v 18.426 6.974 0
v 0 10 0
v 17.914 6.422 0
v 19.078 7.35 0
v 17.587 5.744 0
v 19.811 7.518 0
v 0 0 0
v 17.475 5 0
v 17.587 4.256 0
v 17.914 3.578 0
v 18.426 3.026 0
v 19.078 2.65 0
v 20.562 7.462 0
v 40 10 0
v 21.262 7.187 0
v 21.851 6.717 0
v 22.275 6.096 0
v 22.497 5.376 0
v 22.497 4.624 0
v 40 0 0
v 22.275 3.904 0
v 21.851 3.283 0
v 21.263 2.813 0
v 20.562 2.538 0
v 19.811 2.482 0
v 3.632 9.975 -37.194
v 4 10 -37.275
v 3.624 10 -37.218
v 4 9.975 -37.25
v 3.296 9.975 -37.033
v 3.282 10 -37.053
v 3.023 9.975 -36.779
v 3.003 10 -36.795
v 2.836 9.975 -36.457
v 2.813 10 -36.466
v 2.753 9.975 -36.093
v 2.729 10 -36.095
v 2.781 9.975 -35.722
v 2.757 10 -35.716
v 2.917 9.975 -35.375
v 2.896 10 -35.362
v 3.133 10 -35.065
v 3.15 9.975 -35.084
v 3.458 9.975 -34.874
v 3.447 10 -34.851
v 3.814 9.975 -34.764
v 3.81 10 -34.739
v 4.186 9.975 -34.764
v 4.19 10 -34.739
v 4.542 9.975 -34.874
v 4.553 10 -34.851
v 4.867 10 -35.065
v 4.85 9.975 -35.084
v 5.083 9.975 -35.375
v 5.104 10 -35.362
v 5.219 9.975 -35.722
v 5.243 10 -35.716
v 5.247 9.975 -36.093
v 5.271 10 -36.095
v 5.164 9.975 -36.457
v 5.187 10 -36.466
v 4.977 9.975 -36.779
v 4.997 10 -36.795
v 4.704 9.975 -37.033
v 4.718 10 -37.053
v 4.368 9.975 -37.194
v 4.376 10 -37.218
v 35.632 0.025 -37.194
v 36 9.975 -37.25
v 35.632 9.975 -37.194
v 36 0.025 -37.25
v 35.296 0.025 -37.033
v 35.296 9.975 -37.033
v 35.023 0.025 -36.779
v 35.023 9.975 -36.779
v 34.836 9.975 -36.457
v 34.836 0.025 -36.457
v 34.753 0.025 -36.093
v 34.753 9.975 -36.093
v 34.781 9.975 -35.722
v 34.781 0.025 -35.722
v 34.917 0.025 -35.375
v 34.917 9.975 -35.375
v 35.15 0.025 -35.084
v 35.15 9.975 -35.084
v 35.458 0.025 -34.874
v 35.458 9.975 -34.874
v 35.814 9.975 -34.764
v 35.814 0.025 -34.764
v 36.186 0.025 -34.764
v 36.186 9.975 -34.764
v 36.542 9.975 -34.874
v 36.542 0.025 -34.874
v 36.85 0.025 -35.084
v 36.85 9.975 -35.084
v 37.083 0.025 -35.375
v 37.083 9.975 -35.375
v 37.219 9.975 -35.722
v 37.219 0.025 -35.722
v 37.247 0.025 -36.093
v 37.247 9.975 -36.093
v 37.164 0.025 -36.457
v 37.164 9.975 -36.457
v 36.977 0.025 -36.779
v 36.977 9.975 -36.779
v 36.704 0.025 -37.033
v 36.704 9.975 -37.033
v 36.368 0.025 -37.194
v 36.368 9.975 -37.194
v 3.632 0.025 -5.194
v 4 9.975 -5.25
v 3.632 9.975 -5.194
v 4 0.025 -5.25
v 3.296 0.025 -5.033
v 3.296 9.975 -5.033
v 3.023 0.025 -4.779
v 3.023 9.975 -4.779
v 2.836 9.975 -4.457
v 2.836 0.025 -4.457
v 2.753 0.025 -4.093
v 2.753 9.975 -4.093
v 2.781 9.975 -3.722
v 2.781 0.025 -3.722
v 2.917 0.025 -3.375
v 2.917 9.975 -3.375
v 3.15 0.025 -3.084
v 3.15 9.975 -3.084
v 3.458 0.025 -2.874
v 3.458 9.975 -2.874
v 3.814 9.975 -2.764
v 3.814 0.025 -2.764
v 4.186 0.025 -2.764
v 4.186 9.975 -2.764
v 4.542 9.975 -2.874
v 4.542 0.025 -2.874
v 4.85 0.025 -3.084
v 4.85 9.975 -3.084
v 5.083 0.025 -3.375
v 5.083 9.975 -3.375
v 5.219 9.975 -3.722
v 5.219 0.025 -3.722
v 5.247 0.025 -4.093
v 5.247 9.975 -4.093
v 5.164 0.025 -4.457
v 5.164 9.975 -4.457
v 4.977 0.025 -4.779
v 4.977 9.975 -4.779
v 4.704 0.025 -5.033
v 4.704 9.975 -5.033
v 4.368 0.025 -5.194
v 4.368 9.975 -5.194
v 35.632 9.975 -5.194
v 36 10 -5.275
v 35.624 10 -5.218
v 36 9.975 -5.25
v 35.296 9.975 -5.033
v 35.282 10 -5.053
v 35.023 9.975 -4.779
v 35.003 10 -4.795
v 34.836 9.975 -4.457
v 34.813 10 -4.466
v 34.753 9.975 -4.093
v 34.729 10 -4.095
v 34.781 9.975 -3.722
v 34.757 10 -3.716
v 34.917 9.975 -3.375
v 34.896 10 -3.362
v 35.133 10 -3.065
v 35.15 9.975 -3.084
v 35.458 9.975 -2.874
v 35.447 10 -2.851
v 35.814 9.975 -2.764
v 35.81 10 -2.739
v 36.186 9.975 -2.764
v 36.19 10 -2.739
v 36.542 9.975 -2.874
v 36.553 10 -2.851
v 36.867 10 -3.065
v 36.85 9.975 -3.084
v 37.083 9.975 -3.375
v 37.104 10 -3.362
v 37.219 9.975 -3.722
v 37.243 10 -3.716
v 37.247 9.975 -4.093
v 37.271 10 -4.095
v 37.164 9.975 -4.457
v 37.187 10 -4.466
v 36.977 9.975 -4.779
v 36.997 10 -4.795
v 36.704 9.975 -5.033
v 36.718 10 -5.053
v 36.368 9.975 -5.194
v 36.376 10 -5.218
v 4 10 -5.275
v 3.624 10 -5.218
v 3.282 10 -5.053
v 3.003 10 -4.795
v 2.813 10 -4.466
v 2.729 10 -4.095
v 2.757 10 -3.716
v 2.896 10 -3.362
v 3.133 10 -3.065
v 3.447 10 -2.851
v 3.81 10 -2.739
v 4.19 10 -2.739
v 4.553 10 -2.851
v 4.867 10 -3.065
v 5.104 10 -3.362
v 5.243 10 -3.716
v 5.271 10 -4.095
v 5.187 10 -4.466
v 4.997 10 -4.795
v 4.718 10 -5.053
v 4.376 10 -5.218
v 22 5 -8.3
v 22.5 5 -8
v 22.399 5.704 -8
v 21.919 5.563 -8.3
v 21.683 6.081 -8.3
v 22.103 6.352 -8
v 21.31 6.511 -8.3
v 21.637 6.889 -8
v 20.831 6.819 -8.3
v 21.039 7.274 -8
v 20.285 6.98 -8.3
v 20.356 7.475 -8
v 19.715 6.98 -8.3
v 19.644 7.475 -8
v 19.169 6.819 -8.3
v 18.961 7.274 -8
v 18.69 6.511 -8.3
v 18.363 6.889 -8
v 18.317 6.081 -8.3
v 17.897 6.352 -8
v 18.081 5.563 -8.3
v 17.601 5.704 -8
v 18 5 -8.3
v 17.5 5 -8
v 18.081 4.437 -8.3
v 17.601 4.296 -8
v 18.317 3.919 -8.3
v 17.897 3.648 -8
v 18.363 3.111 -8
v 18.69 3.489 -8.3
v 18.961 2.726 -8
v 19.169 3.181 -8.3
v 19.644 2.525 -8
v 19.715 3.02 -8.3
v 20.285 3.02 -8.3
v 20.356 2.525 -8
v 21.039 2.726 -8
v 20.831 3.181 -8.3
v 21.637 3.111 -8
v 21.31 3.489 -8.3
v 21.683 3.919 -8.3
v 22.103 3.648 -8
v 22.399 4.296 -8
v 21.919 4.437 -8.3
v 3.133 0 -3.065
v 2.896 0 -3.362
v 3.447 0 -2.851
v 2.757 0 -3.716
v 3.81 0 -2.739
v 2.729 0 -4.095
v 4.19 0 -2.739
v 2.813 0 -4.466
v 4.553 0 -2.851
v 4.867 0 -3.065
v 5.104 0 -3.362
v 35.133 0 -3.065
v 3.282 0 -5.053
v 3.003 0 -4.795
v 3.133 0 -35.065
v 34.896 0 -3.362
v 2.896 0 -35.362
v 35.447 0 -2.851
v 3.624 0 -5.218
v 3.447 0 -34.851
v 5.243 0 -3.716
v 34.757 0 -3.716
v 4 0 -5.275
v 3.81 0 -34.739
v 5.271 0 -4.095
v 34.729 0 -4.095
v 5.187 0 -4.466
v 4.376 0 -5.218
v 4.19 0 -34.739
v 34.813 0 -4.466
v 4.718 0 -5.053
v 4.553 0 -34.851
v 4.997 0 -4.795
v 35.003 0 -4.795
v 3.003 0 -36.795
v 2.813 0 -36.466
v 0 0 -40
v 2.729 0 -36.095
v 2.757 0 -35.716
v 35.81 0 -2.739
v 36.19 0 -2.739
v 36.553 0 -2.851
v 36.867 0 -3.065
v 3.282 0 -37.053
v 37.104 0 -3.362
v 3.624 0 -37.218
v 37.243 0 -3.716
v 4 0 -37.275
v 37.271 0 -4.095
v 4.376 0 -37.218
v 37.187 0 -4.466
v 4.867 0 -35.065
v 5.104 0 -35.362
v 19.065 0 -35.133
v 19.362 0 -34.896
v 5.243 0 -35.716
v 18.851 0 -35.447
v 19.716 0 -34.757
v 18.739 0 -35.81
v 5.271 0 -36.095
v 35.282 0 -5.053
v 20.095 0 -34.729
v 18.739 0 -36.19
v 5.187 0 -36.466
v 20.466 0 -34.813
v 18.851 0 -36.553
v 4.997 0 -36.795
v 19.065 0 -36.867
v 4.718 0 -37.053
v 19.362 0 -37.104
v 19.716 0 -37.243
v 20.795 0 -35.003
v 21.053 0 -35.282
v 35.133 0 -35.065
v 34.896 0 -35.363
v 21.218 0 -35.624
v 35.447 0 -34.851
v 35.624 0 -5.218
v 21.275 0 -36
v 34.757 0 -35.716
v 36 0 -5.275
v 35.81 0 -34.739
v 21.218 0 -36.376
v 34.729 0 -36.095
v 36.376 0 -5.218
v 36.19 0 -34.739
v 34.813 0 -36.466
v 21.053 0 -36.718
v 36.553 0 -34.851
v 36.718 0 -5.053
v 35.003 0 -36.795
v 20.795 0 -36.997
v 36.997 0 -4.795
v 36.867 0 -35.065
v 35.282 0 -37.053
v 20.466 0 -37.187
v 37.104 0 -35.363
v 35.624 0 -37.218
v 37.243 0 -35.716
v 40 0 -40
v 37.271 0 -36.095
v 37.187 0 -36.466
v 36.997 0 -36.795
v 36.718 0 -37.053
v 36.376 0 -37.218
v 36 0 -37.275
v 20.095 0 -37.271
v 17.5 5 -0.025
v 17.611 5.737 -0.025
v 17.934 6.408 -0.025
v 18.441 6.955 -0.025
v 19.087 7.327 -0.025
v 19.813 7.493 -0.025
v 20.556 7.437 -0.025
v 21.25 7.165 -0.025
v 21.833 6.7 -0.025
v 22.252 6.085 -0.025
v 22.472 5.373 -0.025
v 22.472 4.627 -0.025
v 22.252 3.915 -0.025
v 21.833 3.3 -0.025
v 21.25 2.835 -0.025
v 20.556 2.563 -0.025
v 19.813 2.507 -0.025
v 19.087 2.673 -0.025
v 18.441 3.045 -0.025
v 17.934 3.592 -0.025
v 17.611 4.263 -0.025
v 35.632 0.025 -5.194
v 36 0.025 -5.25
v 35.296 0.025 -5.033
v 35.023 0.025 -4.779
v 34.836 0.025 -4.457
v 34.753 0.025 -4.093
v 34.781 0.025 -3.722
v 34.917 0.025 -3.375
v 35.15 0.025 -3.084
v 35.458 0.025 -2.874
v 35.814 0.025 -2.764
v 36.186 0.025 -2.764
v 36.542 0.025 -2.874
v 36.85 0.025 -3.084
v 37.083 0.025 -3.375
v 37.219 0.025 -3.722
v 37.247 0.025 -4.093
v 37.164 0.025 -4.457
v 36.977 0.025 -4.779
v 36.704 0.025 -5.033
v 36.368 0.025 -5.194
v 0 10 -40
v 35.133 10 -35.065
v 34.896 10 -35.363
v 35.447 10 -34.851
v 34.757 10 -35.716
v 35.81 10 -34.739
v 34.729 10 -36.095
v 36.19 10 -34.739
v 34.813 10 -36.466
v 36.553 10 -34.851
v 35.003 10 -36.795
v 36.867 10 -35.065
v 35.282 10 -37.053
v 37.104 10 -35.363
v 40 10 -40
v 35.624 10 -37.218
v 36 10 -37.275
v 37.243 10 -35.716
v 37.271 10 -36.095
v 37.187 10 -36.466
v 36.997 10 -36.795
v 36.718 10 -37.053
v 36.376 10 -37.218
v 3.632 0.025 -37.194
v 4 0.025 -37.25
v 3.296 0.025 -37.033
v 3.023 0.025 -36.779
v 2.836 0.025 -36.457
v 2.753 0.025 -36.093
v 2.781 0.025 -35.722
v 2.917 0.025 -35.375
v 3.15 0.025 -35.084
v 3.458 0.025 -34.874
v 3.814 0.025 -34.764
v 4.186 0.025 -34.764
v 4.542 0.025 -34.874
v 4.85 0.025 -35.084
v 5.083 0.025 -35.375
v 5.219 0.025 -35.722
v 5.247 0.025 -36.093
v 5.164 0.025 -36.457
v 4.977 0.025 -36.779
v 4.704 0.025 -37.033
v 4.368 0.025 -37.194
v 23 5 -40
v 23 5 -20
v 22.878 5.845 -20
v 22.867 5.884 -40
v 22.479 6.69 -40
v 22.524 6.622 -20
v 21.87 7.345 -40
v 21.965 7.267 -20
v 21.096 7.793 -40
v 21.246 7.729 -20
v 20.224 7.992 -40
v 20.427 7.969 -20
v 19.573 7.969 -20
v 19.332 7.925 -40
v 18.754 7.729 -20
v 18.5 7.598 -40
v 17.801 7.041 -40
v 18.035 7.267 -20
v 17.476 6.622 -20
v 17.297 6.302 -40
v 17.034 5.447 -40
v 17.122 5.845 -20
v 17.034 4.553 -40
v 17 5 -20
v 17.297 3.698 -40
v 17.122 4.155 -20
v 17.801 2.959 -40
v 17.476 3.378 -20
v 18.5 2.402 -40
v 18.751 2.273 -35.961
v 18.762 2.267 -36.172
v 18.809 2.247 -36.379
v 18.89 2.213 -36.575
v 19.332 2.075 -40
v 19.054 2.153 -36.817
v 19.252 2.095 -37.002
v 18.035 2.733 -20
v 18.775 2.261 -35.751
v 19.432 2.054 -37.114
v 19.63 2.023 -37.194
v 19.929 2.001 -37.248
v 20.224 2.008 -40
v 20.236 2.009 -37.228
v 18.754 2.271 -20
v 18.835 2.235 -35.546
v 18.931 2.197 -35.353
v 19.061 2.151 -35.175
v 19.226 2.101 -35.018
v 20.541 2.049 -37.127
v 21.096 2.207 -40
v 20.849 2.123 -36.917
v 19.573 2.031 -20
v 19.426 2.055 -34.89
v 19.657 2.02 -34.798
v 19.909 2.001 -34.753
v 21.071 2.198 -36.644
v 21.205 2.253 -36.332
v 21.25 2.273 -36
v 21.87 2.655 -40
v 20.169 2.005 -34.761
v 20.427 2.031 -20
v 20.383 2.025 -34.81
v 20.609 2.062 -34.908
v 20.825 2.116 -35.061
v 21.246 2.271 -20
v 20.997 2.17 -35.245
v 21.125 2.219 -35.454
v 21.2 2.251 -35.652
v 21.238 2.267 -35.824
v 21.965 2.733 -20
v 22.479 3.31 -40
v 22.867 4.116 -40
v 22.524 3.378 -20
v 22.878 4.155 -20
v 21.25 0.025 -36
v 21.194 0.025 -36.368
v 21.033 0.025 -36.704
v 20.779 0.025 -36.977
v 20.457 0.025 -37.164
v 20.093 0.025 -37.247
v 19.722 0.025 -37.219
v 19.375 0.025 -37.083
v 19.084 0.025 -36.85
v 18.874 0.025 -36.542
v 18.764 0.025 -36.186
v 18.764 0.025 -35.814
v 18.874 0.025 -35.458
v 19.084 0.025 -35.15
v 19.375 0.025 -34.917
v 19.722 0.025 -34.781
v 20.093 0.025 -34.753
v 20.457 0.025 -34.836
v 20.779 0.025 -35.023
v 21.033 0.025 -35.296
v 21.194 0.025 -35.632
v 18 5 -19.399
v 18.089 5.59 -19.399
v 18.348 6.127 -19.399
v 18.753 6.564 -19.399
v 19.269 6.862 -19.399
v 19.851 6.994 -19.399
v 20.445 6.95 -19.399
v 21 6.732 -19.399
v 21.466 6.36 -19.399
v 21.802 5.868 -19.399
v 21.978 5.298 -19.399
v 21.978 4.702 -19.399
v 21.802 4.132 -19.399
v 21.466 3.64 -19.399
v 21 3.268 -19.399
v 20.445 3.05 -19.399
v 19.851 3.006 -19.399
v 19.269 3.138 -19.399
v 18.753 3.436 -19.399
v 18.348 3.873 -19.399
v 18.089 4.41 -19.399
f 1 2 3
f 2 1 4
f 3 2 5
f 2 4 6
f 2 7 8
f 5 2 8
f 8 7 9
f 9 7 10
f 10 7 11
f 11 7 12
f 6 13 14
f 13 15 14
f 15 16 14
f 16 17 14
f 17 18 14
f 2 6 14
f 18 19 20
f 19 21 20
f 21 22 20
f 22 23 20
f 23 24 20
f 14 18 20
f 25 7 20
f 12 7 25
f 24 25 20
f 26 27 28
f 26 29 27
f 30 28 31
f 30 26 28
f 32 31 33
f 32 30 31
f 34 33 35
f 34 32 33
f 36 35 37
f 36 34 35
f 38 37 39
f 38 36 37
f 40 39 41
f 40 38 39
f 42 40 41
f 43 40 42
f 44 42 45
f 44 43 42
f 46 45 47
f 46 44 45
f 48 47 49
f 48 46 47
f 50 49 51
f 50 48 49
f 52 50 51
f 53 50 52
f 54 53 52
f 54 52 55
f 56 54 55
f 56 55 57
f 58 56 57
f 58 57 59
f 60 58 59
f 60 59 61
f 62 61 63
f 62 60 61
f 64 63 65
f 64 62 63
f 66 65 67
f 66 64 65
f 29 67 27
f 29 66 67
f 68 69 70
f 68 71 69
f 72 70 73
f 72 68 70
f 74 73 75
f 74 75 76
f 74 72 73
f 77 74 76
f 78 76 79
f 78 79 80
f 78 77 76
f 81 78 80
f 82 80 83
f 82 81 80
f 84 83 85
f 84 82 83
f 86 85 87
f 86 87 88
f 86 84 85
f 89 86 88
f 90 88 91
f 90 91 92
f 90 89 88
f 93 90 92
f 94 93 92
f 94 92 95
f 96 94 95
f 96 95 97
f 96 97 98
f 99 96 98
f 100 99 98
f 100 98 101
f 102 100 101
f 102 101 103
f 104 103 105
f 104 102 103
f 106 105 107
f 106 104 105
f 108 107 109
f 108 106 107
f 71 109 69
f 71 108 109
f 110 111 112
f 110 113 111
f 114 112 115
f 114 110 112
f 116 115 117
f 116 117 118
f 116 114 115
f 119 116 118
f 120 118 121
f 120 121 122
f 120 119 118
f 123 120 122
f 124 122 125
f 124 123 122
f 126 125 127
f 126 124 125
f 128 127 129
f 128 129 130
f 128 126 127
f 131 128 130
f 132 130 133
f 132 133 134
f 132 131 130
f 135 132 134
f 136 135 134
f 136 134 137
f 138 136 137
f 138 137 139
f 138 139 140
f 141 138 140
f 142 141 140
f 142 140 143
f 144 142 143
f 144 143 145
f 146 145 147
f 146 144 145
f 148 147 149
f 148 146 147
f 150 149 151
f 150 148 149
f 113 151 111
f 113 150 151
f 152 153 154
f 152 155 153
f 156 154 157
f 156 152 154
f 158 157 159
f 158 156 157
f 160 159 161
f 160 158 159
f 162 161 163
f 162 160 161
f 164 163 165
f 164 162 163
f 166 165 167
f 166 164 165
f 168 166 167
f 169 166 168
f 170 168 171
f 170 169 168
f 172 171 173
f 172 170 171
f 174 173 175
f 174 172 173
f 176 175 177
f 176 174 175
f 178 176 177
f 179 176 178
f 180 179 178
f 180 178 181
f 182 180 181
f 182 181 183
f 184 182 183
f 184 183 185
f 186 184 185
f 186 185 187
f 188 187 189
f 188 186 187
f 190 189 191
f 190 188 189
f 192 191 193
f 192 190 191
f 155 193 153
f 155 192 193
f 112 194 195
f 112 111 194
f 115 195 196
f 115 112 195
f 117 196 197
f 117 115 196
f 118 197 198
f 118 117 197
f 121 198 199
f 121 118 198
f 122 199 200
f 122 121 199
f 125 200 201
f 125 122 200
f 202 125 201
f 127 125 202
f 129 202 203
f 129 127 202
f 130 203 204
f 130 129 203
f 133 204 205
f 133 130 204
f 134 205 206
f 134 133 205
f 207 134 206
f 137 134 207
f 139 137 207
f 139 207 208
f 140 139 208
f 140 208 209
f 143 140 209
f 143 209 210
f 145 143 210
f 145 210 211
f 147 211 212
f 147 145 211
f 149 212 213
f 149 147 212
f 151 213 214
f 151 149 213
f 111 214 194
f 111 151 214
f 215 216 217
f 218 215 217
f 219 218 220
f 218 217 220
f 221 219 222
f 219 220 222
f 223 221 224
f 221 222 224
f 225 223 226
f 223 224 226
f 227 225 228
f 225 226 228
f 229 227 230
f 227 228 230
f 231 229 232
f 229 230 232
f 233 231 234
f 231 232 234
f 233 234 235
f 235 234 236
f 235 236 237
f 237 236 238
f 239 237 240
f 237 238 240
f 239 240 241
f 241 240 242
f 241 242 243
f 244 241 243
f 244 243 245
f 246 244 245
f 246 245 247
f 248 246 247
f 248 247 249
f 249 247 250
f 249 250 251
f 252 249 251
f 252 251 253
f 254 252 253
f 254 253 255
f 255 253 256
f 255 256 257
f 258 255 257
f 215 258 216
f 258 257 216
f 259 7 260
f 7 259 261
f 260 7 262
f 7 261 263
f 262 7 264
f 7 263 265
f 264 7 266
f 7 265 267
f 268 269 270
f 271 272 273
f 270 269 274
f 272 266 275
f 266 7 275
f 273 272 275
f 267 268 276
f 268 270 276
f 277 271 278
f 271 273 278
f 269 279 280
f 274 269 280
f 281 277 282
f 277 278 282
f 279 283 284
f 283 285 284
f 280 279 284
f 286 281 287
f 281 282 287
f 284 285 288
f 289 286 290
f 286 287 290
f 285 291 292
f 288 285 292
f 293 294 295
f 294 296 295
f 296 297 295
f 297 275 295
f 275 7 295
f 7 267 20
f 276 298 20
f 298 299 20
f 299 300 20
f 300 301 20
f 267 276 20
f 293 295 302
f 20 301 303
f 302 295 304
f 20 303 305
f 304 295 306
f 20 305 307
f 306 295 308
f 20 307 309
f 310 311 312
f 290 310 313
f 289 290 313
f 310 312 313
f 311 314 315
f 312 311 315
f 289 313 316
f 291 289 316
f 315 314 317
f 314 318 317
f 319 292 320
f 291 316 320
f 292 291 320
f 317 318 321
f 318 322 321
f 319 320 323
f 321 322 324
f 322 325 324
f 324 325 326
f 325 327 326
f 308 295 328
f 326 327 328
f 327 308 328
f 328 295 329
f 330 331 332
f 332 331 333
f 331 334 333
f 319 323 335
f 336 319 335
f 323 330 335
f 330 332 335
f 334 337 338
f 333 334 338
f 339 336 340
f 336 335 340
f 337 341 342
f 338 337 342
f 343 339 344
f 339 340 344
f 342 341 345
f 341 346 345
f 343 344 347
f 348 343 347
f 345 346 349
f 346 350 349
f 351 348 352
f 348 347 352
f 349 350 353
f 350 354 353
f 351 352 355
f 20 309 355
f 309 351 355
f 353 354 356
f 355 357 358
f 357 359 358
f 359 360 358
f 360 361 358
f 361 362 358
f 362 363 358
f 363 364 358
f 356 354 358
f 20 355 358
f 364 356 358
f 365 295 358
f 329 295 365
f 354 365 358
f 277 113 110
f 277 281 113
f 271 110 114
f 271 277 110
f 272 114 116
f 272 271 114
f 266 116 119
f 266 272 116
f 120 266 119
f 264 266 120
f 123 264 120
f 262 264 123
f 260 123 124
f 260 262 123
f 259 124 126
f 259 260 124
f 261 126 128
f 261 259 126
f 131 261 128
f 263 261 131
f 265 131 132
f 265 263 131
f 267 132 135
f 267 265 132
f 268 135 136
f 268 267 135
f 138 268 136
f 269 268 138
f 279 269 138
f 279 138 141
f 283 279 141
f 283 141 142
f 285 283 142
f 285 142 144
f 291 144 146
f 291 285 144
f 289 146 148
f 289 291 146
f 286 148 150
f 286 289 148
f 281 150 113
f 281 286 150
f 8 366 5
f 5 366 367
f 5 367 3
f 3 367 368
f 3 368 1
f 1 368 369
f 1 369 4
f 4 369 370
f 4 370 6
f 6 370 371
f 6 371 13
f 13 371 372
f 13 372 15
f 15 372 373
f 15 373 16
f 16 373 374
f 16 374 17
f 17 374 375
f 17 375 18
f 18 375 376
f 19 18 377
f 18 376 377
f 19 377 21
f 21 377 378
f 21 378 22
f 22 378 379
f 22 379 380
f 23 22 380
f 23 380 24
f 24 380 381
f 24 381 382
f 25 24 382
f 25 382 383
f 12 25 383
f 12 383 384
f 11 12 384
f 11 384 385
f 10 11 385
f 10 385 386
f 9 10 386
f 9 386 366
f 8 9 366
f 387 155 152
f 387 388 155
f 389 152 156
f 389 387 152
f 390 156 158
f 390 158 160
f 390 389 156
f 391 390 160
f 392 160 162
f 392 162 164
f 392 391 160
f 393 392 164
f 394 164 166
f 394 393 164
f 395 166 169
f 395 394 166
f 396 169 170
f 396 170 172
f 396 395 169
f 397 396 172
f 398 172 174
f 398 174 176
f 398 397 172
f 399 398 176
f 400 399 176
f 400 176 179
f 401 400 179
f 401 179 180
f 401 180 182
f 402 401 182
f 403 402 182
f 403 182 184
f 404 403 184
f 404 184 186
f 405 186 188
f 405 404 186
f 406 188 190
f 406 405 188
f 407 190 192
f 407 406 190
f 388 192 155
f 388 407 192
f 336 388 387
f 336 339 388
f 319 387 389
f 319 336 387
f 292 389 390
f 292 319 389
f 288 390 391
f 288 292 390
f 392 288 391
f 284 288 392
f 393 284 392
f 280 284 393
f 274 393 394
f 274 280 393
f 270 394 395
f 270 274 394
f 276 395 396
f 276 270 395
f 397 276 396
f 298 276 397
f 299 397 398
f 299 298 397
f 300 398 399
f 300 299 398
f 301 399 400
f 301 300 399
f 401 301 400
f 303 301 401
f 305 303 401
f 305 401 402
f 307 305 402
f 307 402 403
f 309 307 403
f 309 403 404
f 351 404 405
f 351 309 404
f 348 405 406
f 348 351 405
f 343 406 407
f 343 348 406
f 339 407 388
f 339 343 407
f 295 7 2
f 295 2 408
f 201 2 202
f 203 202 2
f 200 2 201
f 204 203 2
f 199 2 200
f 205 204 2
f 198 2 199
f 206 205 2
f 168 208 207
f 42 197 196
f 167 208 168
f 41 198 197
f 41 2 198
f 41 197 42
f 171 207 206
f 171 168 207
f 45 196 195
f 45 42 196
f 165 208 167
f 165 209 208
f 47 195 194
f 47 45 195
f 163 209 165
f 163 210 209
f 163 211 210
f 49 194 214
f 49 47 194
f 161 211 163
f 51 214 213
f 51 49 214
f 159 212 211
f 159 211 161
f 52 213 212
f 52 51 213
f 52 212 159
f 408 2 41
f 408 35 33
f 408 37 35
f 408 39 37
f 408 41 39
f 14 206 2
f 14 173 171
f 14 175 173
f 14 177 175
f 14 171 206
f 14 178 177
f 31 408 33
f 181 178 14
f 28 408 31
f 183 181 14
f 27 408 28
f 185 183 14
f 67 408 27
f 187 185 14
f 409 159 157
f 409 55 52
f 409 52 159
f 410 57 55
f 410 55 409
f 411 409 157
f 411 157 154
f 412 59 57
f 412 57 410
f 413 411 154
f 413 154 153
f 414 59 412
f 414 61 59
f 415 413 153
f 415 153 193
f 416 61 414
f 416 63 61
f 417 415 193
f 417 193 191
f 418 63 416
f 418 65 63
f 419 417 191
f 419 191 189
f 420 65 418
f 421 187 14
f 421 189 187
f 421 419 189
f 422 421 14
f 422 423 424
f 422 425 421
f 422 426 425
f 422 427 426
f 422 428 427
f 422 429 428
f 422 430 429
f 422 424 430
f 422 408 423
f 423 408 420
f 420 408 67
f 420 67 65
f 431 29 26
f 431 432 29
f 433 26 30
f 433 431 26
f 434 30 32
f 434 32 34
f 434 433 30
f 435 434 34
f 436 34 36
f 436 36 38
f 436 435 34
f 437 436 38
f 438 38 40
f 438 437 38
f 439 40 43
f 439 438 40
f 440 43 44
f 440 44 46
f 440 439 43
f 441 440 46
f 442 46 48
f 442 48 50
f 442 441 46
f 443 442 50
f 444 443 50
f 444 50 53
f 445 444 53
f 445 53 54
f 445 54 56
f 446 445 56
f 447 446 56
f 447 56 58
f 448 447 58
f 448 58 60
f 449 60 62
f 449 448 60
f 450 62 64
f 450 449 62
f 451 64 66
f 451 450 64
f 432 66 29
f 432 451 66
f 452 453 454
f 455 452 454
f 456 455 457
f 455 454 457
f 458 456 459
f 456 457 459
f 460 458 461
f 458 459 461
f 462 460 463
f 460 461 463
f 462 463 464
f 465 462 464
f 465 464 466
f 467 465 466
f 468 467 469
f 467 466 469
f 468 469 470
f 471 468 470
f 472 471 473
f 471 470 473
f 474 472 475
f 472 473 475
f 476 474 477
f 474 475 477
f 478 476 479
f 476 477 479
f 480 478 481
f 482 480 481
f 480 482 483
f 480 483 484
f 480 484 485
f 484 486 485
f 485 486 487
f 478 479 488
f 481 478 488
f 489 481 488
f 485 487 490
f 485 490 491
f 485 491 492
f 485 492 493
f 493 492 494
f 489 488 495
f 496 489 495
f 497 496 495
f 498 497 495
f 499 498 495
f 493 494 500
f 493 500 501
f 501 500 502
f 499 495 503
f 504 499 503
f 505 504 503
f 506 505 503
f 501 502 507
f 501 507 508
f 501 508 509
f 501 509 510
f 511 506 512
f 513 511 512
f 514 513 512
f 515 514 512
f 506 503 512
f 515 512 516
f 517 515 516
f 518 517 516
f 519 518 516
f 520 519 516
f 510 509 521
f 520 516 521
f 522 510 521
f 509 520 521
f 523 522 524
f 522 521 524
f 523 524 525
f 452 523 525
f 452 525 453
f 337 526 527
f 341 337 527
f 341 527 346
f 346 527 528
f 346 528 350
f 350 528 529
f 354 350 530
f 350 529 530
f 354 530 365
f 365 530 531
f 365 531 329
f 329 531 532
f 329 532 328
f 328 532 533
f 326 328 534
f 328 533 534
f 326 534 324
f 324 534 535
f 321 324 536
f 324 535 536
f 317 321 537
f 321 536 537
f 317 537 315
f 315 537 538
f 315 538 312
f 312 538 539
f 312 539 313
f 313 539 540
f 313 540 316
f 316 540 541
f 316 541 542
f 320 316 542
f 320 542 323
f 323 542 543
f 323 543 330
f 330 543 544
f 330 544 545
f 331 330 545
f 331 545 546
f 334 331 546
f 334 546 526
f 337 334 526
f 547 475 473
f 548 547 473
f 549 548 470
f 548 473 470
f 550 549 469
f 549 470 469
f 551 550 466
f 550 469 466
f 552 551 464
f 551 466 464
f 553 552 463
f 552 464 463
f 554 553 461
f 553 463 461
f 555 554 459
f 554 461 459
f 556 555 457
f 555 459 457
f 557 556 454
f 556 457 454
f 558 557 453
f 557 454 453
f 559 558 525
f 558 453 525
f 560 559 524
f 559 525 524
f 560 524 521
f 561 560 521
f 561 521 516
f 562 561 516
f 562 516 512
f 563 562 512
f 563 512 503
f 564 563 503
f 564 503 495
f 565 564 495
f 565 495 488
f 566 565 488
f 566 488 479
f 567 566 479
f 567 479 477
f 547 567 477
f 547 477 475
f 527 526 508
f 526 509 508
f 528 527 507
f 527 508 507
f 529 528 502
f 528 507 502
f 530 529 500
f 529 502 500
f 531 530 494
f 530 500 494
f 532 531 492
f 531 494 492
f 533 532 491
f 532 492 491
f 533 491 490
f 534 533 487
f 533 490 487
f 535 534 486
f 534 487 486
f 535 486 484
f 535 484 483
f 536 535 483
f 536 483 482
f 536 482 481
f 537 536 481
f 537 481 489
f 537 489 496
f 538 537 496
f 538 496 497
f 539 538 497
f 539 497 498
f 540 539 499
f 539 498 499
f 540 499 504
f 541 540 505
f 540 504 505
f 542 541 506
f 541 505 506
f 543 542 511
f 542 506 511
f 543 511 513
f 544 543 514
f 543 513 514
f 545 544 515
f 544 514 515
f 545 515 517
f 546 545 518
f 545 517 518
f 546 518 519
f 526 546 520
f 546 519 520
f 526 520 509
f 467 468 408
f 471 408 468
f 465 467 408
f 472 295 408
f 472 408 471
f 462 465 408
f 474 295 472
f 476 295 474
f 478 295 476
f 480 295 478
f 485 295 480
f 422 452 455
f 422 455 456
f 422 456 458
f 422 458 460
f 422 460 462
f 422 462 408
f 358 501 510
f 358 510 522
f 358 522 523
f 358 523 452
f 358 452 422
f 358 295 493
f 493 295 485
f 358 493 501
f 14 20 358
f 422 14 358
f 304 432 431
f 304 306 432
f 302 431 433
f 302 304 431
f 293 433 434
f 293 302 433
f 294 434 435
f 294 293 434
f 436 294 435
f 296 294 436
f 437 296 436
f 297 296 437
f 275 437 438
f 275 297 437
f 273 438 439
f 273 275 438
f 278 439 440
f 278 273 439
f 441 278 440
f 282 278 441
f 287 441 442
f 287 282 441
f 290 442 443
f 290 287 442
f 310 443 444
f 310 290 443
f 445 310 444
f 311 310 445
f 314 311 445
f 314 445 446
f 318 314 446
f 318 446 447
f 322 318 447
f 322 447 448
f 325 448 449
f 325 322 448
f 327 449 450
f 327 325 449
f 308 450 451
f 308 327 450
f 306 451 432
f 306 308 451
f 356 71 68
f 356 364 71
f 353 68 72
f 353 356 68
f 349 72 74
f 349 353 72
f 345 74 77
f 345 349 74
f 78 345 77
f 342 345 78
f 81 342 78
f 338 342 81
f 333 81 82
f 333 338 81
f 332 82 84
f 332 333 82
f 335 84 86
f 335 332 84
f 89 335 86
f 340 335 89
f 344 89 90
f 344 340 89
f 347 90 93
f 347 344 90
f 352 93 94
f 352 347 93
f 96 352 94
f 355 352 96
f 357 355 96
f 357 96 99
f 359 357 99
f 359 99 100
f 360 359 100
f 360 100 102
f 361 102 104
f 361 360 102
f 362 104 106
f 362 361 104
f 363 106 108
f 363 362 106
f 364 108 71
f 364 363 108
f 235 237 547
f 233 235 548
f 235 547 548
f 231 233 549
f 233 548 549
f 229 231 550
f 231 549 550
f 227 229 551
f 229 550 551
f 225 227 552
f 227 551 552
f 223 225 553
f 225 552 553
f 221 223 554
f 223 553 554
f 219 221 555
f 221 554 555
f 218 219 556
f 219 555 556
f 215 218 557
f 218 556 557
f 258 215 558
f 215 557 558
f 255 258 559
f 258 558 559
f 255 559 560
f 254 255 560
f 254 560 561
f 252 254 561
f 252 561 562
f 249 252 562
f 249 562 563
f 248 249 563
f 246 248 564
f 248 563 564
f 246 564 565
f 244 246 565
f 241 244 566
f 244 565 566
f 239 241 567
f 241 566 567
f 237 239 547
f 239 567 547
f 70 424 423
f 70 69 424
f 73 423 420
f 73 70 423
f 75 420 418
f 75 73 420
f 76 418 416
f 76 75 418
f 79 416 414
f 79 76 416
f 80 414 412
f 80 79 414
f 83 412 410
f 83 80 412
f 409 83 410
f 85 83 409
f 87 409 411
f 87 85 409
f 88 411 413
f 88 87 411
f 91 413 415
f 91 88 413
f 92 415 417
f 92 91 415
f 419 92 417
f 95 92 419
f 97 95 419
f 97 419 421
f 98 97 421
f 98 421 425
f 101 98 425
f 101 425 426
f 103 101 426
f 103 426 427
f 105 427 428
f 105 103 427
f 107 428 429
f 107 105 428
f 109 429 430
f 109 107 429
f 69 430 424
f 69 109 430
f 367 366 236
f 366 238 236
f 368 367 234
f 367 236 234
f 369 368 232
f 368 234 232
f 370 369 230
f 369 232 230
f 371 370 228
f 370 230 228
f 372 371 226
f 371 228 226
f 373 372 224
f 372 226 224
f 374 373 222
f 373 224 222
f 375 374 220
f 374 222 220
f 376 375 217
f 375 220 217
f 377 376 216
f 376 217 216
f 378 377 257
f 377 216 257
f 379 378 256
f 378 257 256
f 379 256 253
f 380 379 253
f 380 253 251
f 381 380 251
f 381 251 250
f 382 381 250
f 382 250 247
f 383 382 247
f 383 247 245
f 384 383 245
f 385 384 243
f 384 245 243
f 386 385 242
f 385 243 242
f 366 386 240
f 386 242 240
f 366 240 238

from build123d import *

# Parameters (mm, degrees)
ESQUISSE1_W                                         = 40
ESQUISSE1_H                                         = 40
BOSS_EXTRU_1_DEPTH                                  = 10
DIAM_TRE_DU_PER_AGE_4_0_4_1_D                       = 4
TROU_POUR_TARAUDAGE_POUR_TROU_TARAUD_M6_D           = 5
TROU_POUR_TARAUDAGE_POUR_TROU_TARAUD_M6_DEPTH       = 8
TROU_POUR_TARAUDAGE_POUR_TROU_TARAUD_M6_CSINK_D     = 5.05
TROU_POUR_TARAUDAGE_POUR_TROU_TARAUD_M6_CSINK_ANGLE = 90
TROU_POUR_TARAUDAGE_POUR_TROU_TARAUD_M6_TIP         = 1.502151548
DIAM_TRE_DU_PER_AGE_6_0_6_1_D                       = 6
DIAM_TRE_DU_PER_AGE_6_0_6_1_DEPTH                   = 20
DIAM_TRE_DU_PER_AGE_6_0_6_1_TIP                     = 1.802581857
TROU_POUR_TARAUDAGE_POUR_TROU_TARAUD_2_COUNT        = 2
TROU_POUR_TARAUDAGE_POUR_TROU_TARAUD_2_PITCH        = 32
TROU_POUR_TARAUDAGE_POUR_TROU_TARAUD_3_COUNT        = 2
TROU_POUR_TARAUDAGE_POUR_TROU_TARAUD_3_PITCH        = 45.254833996
TROU_POUR_TARAUDAGE_POUR_TROU_TARAUD_4_COUNT        = 2
TROU_POUR_TARAUDAGE_POUR_TROU_TARAUD_4_PITCH        = 32
TROU_POUR_TARAUDAGE_POUR_TROU_TARAUD_5_D            = 2.5
TROU_POUR_TARAUDAGE_POUR_TROU_TARAUD_5_DEPTH        = 5
TROU_POUR_TARAUDAGE_POUR_TROU_TARAUD_5_CSINK_D      = 2.55
TROU_POUR_TARAUDAGE_POUR_TROU_TARAUD_5_CSINK_ANGLE  = 90
TROU_POUR_TARAUDAGE_POUR_TROU_TARAUD_5_TIP          = 0.751075774


with BuildPart() as part:
    # Esquisse1 → Boss.-Extru.1 (new body)
    with BuildSketch(Plane(origin=(0, 0, 0), x_dir=(1, 0, 0), z_dir=(0, 1, 0))):
        with Locations((20, 20)):
            Rectangle(ESQUISSE1_W, ESQUISSE1_H)
    extrude(amount=BOSS_EXTRU_1_DEPTH)

    # Diamètre du perçage Ø4.0 (4)1 (through all)
    with Locations(Plane.XY):
        with Locations((20, 5)):
            Hole(DIAM_TRE_DU_PER_AGE_4_0_4_1_D / 2)

    # Trou pour taraudage pour trou taraudé M61
    with Locations(Plane.XY):
        with Locations((20, 5)):
            CounterSinkHole(TROU_POUR_TARAUDAGE_POUR_TROU_TARAUD_M6_D / 2, TROU_POUR_TARAUDAGE_POUR_TROU_TARAUD_M6_CSINK_D / 2, depth=TROU_POUR_TARAUDAGE_POUR_TROU_TARAUD_M6_DEPTH, counter_sink_angle=TROU_POUR_TARAUDAGE_POUR_TROU_TARAUD_M6_CSINK_ANGLE)
            with Locations((0, 0, -(TROU_POUR_TARAUDAGE_POUR_TROU_TARAUD_M6_DEPTH + TROU_POUR_TARAUDAGE_POUR_TROU_TARAUD_M6_TIP / 2))):  # 118° drill point
                Cone(0, TROU_POUR_TARAUDAGE_POUR_TROU_TARAUD_M6_D / 2, TROU_POUR_TARAUDAGE_POUR_TROU_TARAUD_M6_TIP, mode=Mode.SUBTRACT)

    # Diamètre du perçage Ø6.0 (6)1
    with Locations(Plane(origin=(0, 0, -40), x_dir=(-1, 0, 0), z_dir=(0, 0, -1))):
        with Locations((-20, 5)):
            Hole(DIAM_TRE_DU_PER_AGE_6_0_6_1_D / 2, depth=DIAM_TRE_DU_PER_AGE_6_0_6_1_DEPTH)
            with Locations((0, 0, -(DIAM_TRE_DU_PER_AGE_6_0_6_1_DEPTH + DIAM_TRE_DU_PER_AGE_6_0_6_1_TIP / 2))):  # 118° drill point
                Cone(0, DIAM_TRE_DU_PER_AGE_6_0_6_1_D / 2, DIAM_TRE_DU_PER_AGE_6_0_6_1_TIP, mode=Mode.SUBTRACT)

    # Esquisse17 → Trou pour taraudage pour trou taraud_ M3 (revolve, cut)
    with BuildSketch(Plane(origin=(4, 0, -4), x_dir=(0, 0, -1), z_dir=(1, 0, 0))):
        Polygon((0, 0), (0, 10), (1.275, 10), (1.25, 9.975), (1.25, 0.025), (1.275, 0), align=None)
    trou_pour_taraudage_pour_trou_taraud_m3 = revolve(axis=Axis((4, -6.35, -4), (0, 1, 0)), mode=Mode.SUBTRACT)

    # Trou pour taraudage pour trou taraud 2: Trou pour taraudage pour trou taraud_ M3 ×2
    with Locations(*[(i * TROU_POUR_TARAUDAGE_POUR_TROU_TARAUD_2_PITCH, 0, 0) for i in range(1, TROU_POUR_TARAUDAGE_POUR_TROU_TARAUD_2_COUNT)]):
        add(trou_pour_taraudage_pour_trou_taraud_m3, mode=Mode.SUBTRACT)

    # Trou pour taraudage pour trou taraud 3: Trou pour taraudage pour trou taraud_ M3 ×2
    with Locations(*[Vector(0.7071067811865475, 0, -0.7071067811865476) * (i * TROU_POUR_TARAUDAGE_POUR_TROU_TARAUD_3_PITCH) for i in range(1, TROU_POUR_TARAUDAGE_POUR_TROU_TARAUD_3_COUNT)]):
        add(trou_pour_taraudage_pour_trou_taraud_m3, mode=Mode.SUBTRACT)

    # Trou pour taraudage pour trou taraud 4: Trou pour taraudage pour trou taraud_ M3 ×2
    with Locations(*[(0, 0, -i * TROU_POUR_TARAUDAGE_POUR_TROU_TARAUD_4_PITCH) for i in range(1, TROU_POUR_TARAUDAGE_POUR_TROU_TARAUD_4_COUNT)]):
        add(trou_pour_taraudage_pour_trou_taraud_m3, mode=Mode.SUBTRACT)

    # Trou pour taraudage pour trou taraud 5
    with Locations(Plane(origin=(0, 0, 0), x_dir=(-1, 0, 0), z_dir=(0, -1, 0))):
        with Locations((-20, 36)):
            CounterSinkHole(TROU_POUR_TARAUDAGE_POUR_TROU_TARAUD_5_D / 2, TROU_POUR_TARAUDAGE_POUR_TROU_TARAUD_5_CSINK_D / 2, depth=TROU_POUR_TARAUDAGE_POUR_TROU_TARAUD_5_DEPTH, counter_sink_angle=TROU_POUR_TARAUDAGE_POUR_TROU_TARAUD_5_CSINK_ANGLE)
            with Locations((0, 0, -(TROU_POUR_TARAUDAGE_POUR_TROU_TARAUD_5_DEPTH + TROU_POUR_TARAUDAGE_POUR_TROU_TARAUD_5_TIP / 2))):  # 118° drill point
                Cone(0, TROU_POUR_TARAUDAGE_POUR_TROU_TARAUD_5_D / 2, TROU_POUR_TARAUDAGE_POUR_TROU_TARAUD_5_TIP, mode=Mode.SUBTRACT)


solid = part.part
